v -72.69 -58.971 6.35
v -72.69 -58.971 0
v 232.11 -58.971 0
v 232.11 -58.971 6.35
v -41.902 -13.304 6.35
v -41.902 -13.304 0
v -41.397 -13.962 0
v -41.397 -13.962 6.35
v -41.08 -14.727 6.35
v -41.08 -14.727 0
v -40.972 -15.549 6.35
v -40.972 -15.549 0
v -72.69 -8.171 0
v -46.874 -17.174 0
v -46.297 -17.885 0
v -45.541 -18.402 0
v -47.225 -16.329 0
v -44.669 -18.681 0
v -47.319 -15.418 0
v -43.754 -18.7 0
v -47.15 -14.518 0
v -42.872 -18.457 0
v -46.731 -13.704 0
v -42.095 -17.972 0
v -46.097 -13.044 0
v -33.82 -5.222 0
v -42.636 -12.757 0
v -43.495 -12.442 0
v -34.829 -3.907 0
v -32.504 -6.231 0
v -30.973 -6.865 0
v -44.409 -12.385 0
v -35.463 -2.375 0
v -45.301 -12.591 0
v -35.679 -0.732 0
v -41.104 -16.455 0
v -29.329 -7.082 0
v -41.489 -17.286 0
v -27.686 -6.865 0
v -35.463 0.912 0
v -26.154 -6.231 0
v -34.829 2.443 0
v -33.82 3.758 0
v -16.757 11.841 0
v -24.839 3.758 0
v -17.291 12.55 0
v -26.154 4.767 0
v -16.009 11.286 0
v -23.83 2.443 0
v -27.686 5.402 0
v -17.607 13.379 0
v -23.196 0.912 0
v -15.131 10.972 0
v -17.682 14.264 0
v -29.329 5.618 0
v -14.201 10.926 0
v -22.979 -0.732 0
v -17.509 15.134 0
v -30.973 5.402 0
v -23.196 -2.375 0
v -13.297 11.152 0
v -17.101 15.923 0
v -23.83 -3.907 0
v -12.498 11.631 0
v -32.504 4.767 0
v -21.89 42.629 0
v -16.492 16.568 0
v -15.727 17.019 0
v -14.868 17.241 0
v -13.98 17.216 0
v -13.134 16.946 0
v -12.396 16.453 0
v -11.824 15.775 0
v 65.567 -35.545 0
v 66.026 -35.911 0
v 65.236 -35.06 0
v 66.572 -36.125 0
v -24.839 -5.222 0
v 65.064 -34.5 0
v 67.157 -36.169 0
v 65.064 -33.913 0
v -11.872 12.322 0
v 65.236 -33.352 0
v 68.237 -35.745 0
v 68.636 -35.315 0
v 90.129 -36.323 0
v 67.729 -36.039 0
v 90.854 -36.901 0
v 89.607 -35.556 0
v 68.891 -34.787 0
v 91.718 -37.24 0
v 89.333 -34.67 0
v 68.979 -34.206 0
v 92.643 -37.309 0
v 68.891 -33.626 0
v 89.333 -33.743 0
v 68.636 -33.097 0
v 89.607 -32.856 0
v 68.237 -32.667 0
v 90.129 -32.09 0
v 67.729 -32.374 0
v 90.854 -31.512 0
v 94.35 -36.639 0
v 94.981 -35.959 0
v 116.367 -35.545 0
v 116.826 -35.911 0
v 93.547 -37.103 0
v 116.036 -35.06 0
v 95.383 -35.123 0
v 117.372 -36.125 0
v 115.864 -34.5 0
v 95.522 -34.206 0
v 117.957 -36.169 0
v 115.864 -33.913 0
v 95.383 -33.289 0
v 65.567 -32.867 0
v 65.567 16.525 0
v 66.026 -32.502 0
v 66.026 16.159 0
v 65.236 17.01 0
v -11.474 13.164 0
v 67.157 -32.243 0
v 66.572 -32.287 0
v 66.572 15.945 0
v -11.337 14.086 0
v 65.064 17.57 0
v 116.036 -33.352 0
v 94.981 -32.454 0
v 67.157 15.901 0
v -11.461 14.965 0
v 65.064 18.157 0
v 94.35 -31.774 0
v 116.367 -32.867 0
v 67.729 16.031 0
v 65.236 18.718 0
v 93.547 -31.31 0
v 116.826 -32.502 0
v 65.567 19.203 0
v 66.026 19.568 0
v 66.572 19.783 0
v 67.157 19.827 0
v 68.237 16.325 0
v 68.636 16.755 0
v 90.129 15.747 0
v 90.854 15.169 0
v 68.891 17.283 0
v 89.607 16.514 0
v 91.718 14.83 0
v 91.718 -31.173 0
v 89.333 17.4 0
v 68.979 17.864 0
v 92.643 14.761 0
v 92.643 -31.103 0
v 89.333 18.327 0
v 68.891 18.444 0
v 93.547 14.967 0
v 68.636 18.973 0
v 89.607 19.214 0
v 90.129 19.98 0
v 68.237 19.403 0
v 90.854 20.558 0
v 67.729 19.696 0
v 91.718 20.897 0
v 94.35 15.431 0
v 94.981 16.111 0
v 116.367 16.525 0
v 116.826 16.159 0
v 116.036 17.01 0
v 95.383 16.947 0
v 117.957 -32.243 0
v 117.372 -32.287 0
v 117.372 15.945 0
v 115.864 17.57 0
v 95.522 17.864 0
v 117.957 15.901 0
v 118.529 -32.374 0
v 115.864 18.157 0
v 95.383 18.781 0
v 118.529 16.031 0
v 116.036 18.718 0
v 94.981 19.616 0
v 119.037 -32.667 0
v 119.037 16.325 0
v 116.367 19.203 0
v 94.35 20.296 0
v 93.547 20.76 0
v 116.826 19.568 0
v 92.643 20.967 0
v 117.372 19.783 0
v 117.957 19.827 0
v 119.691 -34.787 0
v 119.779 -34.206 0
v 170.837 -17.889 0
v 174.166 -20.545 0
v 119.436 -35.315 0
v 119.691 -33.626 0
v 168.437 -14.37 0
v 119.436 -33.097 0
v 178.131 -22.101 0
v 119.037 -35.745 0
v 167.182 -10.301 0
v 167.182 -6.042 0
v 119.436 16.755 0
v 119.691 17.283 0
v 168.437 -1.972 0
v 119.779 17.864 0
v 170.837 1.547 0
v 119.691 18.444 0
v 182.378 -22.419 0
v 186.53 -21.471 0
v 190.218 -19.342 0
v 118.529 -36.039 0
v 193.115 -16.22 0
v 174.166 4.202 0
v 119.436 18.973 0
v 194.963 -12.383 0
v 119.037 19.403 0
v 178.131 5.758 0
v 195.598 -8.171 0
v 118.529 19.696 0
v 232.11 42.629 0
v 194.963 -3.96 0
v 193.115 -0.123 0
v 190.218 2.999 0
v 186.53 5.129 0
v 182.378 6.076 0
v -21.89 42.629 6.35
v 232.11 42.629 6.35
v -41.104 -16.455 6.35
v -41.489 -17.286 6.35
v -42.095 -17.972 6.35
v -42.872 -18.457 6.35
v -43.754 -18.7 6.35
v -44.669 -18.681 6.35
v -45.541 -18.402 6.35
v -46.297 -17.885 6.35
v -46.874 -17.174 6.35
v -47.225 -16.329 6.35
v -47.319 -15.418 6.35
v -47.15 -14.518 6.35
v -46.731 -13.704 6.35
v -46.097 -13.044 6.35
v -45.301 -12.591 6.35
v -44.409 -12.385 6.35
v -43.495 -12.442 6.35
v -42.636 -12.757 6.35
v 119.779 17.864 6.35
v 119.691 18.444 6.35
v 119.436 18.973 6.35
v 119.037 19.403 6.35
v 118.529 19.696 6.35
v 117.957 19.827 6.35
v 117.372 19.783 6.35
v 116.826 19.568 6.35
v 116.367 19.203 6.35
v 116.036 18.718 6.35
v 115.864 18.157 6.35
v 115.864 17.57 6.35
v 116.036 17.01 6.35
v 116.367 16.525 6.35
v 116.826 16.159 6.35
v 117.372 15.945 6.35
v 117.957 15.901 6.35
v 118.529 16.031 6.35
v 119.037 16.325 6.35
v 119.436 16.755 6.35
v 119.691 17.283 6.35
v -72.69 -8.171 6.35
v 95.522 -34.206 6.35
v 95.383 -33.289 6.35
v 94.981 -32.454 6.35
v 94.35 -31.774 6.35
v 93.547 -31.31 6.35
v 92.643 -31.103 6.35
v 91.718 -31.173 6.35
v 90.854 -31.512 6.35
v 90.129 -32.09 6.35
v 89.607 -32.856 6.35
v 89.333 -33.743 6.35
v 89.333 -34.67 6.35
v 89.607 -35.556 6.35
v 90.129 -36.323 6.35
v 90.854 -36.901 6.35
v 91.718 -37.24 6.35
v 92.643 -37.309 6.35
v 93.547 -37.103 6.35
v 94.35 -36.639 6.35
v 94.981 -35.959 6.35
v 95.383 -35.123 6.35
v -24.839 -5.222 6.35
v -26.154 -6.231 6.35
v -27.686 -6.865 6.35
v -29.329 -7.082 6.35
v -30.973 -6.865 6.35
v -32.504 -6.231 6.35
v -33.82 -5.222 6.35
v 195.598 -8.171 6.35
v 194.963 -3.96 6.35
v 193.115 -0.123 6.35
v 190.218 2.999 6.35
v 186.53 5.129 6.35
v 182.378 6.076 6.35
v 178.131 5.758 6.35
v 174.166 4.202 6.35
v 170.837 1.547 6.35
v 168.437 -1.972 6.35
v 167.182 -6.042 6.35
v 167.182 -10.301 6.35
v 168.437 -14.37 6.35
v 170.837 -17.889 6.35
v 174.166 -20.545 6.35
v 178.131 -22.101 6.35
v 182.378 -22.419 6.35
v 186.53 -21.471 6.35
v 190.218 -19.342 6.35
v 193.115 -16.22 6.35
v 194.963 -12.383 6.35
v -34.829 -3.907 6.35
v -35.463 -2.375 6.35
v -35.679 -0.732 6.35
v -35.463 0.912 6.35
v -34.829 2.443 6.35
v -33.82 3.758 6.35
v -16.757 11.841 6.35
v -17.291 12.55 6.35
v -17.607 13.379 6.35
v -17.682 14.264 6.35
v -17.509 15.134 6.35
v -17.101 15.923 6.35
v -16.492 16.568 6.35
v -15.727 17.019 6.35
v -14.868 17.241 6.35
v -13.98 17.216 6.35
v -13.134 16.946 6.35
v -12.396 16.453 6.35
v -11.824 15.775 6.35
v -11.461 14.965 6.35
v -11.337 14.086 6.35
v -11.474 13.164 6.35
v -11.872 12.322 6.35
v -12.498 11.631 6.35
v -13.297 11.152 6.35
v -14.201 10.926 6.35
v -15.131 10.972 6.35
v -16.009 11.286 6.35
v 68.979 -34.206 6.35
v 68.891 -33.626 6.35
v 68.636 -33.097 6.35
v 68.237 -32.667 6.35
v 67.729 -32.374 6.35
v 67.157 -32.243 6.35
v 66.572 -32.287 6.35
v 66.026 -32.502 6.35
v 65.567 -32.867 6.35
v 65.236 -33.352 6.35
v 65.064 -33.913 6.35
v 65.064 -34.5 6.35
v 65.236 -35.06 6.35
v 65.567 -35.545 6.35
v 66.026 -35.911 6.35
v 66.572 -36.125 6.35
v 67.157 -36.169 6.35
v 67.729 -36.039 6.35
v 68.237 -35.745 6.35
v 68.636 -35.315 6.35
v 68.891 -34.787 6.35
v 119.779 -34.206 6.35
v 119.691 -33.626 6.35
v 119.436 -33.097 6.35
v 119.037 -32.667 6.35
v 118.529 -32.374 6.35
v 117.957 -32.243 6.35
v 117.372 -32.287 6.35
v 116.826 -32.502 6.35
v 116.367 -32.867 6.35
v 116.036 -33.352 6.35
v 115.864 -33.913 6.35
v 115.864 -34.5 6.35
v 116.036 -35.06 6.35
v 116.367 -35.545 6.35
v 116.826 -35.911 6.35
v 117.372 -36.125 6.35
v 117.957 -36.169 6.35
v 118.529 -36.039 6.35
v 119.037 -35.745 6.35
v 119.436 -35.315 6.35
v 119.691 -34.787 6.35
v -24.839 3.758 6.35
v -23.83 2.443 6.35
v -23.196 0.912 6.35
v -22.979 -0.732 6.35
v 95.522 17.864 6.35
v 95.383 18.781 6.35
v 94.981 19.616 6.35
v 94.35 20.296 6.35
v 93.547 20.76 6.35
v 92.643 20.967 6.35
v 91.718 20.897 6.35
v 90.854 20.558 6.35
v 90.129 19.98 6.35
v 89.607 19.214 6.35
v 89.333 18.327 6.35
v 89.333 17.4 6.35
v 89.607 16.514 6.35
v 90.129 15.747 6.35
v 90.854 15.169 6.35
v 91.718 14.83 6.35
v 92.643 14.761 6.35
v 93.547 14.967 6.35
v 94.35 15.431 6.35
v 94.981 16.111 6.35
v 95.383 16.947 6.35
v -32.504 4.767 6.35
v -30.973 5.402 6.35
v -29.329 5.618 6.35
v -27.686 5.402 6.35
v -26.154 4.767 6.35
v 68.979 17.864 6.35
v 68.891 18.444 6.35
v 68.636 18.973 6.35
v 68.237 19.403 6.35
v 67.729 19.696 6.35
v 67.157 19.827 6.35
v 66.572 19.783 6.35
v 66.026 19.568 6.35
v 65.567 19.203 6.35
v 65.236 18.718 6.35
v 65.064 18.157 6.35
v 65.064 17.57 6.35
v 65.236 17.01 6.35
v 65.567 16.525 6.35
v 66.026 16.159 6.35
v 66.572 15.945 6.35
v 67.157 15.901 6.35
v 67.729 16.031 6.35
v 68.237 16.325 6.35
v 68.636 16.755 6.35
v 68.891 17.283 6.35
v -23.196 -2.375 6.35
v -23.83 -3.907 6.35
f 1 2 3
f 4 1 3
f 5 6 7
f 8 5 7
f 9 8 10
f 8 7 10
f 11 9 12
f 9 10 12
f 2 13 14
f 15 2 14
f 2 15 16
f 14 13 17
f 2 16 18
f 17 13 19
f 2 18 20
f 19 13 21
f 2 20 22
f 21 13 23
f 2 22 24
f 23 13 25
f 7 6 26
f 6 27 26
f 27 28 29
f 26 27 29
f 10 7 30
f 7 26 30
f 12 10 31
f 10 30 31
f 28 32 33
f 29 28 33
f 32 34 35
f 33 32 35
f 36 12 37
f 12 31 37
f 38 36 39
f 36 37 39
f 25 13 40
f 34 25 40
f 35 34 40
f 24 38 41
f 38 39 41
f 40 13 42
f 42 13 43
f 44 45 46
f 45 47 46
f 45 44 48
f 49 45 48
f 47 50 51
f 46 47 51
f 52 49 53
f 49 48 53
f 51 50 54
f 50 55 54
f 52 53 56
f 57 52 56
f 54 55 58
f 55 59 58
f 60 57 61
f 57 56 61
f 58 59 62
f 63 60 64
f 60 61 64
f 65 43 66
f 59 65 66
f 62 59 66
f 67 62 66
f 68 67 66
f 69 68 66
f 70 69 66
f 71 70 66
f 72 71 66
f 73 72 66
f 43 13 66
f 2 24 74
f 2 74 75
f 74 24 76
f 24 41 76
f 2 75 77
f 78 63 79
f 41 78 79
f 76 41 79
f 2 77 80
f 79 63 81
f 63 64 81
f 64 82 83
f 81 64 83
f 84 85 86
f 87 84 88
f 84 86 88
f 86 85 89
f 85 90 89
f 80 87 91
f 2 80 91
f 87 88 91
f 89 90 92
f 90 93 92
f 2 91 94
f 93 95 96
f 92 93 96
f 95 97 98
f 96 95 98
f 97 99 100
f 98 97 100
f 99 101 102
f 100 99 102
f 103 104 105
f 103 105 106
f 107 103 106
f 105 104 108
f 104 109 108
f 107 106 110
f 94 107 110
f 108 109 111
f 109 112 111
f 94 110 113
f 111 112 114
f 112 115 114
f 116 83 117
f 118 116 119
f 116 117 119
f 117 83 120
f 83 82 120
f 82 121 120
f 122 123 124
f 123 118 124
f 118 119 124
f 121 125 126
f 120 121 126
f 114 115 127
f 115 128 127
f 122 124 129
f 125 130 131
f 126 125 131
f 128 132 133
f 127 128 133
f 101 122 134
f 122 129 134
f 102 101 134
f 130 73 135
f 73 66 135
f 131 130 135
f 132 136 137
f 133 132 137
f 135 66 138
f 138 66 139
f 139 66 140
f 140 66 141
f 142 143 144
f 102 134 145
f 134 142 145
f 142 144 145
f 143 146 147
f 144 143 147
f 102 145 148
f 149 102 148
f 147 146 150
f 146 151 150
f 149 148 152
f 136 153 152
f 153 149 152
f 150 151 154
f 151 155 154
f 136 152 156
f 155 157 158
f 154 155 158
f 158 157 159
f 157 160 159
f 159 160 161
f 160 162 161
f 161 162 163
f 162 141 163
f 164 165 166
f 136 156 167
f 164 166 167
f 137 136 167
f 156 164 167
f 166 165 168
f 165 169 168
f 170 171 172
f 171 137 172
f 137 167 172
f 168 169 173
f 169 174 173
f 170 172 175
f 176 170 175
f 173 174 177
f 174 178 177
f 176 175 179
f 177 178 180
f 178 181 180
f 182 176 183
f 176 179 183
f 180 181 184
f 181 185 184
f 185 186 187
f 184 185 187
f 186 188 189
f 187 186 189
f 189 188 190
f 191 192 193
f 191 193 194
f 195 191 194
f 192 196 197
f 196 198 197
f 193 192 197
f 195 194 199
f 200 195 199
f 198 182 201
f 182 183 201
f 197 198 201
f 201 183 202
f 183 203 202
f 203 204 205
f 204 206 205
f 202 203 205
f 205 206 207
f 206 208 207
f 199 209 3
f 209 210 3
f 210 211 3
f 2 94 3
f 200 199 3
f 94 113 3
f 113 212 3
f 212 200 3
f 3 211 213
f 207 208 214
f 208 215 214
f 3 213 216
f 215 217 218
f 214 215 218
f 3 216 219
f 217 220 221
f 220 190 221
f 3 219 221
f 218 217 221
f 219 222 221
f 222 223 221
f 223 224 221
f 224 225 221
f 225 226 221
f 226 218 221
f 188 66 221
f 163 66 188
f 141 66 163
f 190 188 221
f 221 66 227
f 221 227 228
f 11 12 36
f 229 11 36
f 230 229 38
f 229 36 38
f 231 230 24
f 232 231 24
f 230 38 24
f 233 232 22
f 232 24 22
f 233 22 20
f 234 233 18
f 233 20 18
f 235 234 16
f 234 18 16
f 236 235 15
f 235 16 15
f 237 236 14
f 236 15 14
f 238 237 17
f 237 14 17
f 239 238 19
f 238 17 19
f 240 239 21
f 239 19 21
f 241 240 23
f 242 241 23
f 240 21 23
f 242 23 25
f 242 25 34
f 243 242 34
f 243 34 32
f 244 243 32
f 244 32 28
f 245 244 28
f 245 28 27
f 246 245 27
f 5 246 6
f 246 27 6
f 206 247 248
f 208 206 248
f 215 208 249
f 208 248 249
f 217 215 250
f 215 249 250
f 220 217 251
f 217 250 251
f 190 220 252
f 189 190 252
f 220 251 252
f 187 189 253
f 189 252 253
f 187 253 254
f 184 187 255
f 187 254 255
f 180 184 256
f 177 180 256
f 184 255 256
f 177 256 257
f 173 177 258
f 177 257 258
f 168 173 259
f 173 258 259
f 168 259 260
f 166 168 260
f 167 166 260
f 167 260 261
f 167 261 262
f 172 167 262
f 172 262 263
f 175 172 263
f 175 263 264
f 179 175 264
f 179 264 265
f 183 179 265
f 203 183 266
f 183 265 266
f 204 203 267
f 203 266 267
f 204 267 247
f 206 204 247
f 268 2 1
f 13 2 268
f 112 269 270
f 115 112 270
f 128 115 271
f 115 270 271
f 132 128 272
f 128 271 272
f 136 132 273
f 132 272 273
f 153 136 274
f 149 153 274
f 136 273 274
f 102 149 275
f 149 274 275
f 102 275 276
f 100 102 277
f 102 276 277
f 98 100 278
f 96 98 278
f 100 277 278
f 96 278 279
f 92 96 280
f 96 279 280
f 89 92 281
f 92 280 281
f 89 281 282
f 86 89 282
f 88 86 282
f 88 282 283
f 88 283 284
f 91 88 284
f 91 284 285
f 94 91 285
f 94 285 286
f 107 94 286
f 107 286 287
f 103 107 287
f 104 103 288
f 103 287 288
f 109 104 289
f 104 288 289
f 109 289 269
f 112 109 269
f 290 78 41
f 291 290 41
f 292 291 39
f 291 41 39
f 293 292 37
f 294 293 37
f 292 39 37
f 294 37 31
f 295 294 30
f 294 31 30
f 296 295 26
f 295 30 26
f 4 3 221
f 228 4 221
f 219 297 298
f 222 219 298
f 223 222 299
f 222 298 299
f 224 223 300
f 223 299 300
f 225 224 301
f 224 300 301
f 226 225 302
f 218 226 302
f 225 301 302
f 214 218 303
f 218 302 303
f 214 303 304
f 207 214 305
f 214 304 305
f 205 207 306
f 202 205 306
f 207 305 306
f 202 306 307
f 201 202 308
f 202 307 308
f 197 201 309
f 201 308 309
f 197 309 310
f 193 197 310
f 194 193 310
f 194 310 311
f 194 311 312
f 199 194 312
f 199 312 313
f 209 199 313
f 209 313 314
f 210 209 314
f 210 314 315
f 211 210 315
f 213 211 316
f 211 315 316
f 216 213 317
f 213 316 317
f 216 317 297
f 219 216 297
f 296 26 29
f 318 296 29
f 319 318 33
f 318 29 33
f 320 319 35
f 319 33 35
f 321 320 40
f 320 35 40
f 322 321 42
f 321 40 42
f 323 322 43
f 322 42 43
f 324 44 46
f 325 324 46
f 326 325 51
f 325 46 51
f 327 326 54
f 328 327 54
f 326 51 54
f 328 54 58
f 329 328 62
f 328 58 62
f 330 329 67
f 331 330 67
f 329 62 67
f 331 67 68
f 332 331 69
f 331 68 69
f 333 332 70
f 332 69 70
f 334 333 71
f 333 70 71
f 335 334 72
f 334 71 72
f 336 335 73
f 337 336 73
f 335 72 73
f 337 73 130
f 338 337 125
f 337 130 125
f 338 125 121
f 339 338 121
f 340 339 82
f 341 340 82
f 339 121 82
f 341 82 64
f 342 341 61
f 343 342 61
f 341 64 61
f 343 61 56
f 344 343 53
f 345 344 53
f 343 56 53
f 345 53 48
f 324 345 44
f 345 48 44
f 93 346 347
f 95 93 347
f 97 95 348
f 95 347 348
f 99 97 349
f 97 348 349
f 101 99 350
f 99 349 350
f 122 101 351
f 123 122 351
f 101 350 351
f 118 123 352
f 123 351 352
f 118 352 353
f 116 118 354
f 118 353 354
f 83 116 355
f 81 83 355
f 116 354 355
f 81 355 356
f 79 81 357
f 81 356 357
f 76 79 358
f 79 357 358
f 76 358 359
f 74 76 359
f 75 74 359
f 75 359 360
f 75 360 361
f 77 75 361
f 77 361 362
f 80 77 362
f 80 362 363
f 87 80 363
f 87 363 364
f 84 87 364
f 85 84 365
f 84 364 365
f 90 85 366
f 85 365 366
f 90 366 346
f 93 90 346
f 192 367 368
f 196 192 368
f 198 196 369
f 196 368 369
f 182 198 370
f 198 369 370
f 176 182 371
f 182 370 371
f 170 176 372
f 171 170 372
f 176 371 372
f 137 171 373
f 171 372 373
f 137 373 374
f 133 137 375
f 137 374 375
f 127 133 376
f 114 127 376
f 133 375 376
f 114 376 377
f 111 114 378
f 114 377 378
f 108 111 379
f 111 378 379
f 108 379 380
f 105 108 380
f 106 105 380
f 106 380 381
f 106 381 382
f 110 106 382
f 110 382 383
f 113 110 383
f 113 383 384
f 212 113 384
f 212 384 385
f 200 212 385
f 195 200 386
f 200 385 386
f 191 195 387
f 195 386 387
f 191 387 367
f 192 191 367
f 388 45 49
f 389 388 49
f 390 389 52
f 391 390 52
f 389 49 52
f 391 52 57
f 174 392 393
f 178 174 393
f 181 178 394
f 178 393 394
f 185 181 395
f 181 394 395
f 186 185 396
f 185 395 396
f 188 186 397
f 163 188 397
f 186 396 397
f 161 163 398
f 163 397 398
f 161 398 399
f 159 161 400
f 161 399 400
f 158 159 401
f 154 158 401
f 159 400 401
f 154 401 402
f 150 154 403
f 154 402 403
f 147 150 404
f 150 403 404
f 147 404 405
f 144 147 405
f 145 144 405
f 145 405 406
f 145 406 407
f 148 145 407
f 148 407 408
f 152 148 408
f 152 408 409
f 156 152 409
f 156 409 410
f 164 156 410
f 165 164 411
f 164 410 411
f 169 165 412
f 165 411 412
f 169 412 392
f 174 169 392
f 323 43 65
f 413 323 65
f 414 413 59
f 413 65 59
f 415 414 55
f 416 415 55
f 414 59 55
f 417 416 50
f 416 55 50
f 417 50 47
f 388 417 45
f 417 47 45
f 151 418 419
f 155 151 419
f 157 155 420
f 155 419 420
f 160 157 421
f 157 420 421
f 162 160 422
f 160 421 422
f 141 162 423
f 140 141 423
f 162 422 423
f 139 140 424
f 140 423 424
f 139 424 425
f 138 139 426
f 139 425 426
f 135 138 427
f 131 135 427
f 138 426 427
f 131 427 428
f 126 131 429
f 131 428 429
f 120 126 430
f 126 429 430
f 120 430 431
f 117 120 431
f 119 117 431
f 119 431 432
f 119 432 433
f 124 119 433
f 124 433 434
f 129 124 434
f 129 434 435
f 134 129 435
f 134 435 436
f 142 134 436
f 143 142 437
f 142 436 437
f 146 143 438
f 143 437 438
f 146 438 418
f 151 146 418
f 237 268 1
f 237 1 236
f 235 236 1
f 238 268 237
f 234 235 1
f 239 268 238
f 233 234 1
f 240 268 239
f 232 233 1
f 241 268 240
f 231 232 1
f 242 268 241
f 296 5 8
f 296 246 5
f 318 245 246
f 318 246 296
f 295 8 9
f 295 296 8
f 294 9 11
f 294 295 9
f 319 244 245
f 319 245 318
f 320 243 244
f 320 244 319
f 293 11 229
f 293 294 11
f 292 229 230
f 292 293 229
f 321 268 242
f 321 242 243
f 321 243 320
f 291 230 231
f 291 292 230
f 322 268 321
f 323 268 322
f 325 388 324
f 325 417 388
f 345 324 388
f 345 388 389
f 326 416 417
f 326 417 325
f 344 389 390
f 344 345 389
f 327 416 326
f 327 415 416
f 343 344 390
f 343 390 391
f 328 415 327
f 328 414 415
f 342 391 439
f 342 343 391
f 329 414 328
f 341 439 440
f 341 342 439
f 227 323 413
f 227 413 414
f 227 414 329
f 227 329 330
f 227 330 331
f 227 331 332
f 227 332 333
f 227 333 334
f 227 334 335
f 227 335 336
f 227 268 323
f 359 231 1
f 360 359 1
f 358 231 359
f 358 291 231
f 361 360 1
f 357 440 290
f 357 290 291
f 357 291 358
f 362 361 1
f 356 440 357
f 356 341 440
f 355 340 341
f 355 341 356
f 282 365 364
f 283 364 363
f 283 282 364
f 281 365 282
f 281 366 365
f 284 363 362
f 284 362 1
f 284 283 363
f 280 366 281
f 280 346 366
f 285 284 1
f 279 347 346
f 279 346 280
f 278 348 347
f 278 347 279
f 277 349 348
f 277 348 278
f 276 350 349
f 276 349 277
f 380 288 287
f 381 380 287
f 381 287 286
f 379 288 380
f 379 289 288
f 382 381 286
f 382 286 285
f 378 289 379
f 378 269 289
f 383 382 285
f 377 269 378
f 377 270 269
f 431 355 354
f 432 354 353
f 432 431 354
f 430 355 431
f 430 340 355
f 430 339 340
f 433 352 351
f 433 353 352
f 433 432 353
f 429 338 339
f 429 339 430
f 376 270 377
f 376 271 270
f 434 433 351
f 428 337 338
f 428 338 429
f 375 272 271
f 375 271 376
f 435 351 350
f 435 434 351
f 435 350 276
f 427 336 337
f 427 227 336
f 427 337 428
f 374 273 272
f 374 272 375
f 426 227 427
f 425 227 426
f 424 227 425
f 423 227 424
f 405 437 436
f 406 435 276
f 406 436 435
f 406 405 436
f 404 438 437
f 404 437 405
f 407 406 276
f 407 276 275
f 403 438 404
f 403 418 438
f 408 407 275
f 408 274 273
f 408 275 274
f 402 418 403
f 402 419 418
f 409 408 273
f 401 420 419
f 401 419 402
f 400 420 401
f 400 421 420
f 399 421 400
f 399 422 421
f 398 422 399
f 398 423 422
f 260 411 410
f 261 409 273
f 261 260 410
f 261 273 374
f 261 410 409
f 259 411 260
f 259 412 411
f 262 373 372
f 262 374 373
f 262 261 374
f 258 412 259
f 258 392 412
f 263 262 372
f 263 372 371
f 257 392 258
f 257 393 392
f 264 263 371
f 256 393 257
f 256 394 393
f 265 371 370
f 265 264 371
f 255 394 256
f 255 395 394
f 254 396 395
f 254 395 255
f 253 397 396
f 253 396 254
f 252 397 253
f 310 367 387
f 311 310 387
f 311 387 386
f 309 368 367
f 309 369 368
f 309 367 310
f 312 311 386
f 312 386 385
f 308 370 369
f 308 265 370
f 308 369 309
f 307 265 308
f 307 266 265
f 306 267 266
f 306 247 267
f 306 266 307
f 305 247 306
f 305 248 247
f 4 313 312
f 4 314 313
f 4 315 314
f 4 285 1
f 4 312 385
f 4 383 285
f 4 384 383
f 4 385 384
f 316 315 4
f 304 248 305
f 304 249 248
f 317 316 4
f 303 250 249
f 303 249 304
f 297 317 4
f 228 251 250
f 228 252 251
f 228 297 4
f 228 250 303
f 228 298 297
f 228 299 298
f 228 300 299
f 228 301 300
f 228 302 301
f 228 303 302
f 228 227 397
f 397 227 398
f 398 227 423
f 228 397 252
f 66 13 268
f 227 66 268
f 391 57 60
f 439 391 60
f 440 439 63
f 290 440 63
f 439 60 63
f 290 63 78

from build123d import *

# Parameters (mm, degrees)
F0_W      = 304.8
F0_H      = 101.6
F1_DEPTH  = 6.35
F3_R      = 14.2875
F4_DEPTH  = 6.35
F5_R      = 3.1115
F9_DEPTH  = 6.35
F6_R      = 3.1115
F10_DEPTH = 6.35
F7_R      = 1.9685
F11_DEPTH = 6.35
F8_R      = 1.9685
F12_DEPTH = 6.35
F15_DEPTH = 6.35
F13_R     = 1.9685
F16_DEPTH = 6.35
F14_R     = 1.9685
F17_DEPTH = 6.35
F18_SIZE  = 50.8
F20_DEPTH = 6.35


with BuildPart() as f1:
    # F0 (on Top) → F1 (new body)
    with BuildSketch(Plane.XY):
        with Locations((79.710026, -8.171286)):
            Rectangle(F0_W, F0_H)
    extrude(amount=F1_DEPTH)

    # F3 (on face) → F4 (cut)
    with BuildSketch(Plane.XY.offset(6.35)):
        with Locations((181.310026, -8.171286)):
            Circle(F3_R)
    extrude(amount=-F4_DEPTH, mode=Mode.SUBTRACT)

    # F5 (on face) → F9 (cut)
    with BuildSketch(Plane.XY.offset(6.35)):
        with Locations((92.410026, 17.863714)):
            Circle(F5_R)
    extrude(amount=-F9_DEPTH, mode=Mode.SUBTRACT)

    # F6 (on face) → F10 (cut)
    with BuildSketch(Plane.XY.offset(6.35)):
        with Locations((92.410026, -34.206286)):
            Circle(F6_R)
    extrude(amount=-F10_DEPTH, mode=Mode.SUBTRACT)

    # F7 (on face) → F11 (cut)
    with BuildSketch(Plane.XY.offset(6.35)):
        with Locations((117.810026, 17.863714)):
            Circle(F7_R)
    extrude(amount=-F11_DEPTH, mode=Mode.SUBTRACT)

    # F8 (on face) → F12 (cut)
    with BuildSketch(Plane.XY.offset(6.35)):
        with Locations((67.010026, 17.863714)):
            Circle(F8_R)
    extrude(amount=-F12_DEPTH, mode=Mode.SUBTRACT)

    # F6 (on face) → F15 (cut)
    with BuildSketch(Plane.XY.offset(6.35)):
        with Locations((92.410026, -34.206286)):
            Circle(F6_R)
    extrude(amount=-F15_DEPTH, mode=Mode.SUBTRACT)

    # F13 (on face) → F16 (cut)
    with BuildSketch(Plane.XY.offset(6.35)):
        with Locations((67.010026, -34.206286)):
            Circle(F13_R)
    extrude(amount=-F16_DEPTH, mode=Mode.SUBTRACT)

    # F14 (on face) → F17 (cut)
    with BuildSketch(Plane.XY.offset(6.35)):
        with Locations((117.810026, -34.206286)):
            Circle(F14_R)
    extrude(amount=-F17_DEPTH, mode=Mode.SUBTRACT)

    # F18
    f18_edges = [f1.edges().sort_by_distance(p)[0] for p in [
        (-72.689974, 42.628714, 3.175),
    ]]
    chamfer(f18_edges, length=F18_SIZE)

    # F19 (on face) → F20 (cut)
    with BuildSketch(Plane(origin=(0, 0, 0), x_dir=(1, 0, 0), z_dir=(0, 0, -1))):
        with BuildLine():
            Line((-33.819589, 5.221926), (-29.329461, 0.731798))
            Line((-29.329461, 0.731798), (-24.839333, 5.221926))
            ThreePointArc((-24.839333, 5.221926), (-29.329461, 7.081798), (-33.819589, 5.221926))
        make_face()
        with BuildLine():
            Line((-24.839333, 5.221926), (-29.329461, 0.731798))
            Line((-29.329461, 0.731798), (-24.839333, -3.75833))
            ThreePointArc((-24.839333, -3.75833), (-23.462826, -1.698242), (-22.979461, 0.731798))
            ThreePointArc((-22.979461, 0.731798), (-23.462826, 3.161838), (-24.839333, 5.221926))
        make_face()
        with BuildLine():
            Line((-29.329461, 0.731798), (-33.819589, -3.75833))
            ThreePointArc((-33.819589, -3.75833), (-29.329461, -5.618202), (-24.839333, -3.75833))
            Line((-24.839333, -3.75833), (-29.329461, 0.731798))
        make_face()
        with BuildLine():
            ThreePointArc((-11.337039, -14.085625), (-13.297019, -11.152307), (-16.757103, -11.840561))
            ThreePointArc((-16.757103, -11.840561), (-15.727059, -17.018942), (-11.337039, -14.085625))
        make_face()
        with BuildLine():
            ThreePointArc((-40.971884, 15.549221), (-47.080201, 16.76424), (-41.90182, 13.304157))
            ThreePointArc((-41.90182, 13.304157), (-41.213566, 14.334201), (-40.971884, 15.549221))
        make_face()
        with BuildLine():
            ThreePointArc((-33.819589, 5.221926), (-35.679461, 0.731798), (-33.819589, -3.75833))
            Line((-33.819589, -3.75833), (-29.329461, 0.731798))
            Line((-29.329461, 0.731798), (-33.819589, 5.221926))
        make_face()
    extrude(amount=-F20_DEPTH, mode=Mode.SUBTRACT)


solid = f1.part
